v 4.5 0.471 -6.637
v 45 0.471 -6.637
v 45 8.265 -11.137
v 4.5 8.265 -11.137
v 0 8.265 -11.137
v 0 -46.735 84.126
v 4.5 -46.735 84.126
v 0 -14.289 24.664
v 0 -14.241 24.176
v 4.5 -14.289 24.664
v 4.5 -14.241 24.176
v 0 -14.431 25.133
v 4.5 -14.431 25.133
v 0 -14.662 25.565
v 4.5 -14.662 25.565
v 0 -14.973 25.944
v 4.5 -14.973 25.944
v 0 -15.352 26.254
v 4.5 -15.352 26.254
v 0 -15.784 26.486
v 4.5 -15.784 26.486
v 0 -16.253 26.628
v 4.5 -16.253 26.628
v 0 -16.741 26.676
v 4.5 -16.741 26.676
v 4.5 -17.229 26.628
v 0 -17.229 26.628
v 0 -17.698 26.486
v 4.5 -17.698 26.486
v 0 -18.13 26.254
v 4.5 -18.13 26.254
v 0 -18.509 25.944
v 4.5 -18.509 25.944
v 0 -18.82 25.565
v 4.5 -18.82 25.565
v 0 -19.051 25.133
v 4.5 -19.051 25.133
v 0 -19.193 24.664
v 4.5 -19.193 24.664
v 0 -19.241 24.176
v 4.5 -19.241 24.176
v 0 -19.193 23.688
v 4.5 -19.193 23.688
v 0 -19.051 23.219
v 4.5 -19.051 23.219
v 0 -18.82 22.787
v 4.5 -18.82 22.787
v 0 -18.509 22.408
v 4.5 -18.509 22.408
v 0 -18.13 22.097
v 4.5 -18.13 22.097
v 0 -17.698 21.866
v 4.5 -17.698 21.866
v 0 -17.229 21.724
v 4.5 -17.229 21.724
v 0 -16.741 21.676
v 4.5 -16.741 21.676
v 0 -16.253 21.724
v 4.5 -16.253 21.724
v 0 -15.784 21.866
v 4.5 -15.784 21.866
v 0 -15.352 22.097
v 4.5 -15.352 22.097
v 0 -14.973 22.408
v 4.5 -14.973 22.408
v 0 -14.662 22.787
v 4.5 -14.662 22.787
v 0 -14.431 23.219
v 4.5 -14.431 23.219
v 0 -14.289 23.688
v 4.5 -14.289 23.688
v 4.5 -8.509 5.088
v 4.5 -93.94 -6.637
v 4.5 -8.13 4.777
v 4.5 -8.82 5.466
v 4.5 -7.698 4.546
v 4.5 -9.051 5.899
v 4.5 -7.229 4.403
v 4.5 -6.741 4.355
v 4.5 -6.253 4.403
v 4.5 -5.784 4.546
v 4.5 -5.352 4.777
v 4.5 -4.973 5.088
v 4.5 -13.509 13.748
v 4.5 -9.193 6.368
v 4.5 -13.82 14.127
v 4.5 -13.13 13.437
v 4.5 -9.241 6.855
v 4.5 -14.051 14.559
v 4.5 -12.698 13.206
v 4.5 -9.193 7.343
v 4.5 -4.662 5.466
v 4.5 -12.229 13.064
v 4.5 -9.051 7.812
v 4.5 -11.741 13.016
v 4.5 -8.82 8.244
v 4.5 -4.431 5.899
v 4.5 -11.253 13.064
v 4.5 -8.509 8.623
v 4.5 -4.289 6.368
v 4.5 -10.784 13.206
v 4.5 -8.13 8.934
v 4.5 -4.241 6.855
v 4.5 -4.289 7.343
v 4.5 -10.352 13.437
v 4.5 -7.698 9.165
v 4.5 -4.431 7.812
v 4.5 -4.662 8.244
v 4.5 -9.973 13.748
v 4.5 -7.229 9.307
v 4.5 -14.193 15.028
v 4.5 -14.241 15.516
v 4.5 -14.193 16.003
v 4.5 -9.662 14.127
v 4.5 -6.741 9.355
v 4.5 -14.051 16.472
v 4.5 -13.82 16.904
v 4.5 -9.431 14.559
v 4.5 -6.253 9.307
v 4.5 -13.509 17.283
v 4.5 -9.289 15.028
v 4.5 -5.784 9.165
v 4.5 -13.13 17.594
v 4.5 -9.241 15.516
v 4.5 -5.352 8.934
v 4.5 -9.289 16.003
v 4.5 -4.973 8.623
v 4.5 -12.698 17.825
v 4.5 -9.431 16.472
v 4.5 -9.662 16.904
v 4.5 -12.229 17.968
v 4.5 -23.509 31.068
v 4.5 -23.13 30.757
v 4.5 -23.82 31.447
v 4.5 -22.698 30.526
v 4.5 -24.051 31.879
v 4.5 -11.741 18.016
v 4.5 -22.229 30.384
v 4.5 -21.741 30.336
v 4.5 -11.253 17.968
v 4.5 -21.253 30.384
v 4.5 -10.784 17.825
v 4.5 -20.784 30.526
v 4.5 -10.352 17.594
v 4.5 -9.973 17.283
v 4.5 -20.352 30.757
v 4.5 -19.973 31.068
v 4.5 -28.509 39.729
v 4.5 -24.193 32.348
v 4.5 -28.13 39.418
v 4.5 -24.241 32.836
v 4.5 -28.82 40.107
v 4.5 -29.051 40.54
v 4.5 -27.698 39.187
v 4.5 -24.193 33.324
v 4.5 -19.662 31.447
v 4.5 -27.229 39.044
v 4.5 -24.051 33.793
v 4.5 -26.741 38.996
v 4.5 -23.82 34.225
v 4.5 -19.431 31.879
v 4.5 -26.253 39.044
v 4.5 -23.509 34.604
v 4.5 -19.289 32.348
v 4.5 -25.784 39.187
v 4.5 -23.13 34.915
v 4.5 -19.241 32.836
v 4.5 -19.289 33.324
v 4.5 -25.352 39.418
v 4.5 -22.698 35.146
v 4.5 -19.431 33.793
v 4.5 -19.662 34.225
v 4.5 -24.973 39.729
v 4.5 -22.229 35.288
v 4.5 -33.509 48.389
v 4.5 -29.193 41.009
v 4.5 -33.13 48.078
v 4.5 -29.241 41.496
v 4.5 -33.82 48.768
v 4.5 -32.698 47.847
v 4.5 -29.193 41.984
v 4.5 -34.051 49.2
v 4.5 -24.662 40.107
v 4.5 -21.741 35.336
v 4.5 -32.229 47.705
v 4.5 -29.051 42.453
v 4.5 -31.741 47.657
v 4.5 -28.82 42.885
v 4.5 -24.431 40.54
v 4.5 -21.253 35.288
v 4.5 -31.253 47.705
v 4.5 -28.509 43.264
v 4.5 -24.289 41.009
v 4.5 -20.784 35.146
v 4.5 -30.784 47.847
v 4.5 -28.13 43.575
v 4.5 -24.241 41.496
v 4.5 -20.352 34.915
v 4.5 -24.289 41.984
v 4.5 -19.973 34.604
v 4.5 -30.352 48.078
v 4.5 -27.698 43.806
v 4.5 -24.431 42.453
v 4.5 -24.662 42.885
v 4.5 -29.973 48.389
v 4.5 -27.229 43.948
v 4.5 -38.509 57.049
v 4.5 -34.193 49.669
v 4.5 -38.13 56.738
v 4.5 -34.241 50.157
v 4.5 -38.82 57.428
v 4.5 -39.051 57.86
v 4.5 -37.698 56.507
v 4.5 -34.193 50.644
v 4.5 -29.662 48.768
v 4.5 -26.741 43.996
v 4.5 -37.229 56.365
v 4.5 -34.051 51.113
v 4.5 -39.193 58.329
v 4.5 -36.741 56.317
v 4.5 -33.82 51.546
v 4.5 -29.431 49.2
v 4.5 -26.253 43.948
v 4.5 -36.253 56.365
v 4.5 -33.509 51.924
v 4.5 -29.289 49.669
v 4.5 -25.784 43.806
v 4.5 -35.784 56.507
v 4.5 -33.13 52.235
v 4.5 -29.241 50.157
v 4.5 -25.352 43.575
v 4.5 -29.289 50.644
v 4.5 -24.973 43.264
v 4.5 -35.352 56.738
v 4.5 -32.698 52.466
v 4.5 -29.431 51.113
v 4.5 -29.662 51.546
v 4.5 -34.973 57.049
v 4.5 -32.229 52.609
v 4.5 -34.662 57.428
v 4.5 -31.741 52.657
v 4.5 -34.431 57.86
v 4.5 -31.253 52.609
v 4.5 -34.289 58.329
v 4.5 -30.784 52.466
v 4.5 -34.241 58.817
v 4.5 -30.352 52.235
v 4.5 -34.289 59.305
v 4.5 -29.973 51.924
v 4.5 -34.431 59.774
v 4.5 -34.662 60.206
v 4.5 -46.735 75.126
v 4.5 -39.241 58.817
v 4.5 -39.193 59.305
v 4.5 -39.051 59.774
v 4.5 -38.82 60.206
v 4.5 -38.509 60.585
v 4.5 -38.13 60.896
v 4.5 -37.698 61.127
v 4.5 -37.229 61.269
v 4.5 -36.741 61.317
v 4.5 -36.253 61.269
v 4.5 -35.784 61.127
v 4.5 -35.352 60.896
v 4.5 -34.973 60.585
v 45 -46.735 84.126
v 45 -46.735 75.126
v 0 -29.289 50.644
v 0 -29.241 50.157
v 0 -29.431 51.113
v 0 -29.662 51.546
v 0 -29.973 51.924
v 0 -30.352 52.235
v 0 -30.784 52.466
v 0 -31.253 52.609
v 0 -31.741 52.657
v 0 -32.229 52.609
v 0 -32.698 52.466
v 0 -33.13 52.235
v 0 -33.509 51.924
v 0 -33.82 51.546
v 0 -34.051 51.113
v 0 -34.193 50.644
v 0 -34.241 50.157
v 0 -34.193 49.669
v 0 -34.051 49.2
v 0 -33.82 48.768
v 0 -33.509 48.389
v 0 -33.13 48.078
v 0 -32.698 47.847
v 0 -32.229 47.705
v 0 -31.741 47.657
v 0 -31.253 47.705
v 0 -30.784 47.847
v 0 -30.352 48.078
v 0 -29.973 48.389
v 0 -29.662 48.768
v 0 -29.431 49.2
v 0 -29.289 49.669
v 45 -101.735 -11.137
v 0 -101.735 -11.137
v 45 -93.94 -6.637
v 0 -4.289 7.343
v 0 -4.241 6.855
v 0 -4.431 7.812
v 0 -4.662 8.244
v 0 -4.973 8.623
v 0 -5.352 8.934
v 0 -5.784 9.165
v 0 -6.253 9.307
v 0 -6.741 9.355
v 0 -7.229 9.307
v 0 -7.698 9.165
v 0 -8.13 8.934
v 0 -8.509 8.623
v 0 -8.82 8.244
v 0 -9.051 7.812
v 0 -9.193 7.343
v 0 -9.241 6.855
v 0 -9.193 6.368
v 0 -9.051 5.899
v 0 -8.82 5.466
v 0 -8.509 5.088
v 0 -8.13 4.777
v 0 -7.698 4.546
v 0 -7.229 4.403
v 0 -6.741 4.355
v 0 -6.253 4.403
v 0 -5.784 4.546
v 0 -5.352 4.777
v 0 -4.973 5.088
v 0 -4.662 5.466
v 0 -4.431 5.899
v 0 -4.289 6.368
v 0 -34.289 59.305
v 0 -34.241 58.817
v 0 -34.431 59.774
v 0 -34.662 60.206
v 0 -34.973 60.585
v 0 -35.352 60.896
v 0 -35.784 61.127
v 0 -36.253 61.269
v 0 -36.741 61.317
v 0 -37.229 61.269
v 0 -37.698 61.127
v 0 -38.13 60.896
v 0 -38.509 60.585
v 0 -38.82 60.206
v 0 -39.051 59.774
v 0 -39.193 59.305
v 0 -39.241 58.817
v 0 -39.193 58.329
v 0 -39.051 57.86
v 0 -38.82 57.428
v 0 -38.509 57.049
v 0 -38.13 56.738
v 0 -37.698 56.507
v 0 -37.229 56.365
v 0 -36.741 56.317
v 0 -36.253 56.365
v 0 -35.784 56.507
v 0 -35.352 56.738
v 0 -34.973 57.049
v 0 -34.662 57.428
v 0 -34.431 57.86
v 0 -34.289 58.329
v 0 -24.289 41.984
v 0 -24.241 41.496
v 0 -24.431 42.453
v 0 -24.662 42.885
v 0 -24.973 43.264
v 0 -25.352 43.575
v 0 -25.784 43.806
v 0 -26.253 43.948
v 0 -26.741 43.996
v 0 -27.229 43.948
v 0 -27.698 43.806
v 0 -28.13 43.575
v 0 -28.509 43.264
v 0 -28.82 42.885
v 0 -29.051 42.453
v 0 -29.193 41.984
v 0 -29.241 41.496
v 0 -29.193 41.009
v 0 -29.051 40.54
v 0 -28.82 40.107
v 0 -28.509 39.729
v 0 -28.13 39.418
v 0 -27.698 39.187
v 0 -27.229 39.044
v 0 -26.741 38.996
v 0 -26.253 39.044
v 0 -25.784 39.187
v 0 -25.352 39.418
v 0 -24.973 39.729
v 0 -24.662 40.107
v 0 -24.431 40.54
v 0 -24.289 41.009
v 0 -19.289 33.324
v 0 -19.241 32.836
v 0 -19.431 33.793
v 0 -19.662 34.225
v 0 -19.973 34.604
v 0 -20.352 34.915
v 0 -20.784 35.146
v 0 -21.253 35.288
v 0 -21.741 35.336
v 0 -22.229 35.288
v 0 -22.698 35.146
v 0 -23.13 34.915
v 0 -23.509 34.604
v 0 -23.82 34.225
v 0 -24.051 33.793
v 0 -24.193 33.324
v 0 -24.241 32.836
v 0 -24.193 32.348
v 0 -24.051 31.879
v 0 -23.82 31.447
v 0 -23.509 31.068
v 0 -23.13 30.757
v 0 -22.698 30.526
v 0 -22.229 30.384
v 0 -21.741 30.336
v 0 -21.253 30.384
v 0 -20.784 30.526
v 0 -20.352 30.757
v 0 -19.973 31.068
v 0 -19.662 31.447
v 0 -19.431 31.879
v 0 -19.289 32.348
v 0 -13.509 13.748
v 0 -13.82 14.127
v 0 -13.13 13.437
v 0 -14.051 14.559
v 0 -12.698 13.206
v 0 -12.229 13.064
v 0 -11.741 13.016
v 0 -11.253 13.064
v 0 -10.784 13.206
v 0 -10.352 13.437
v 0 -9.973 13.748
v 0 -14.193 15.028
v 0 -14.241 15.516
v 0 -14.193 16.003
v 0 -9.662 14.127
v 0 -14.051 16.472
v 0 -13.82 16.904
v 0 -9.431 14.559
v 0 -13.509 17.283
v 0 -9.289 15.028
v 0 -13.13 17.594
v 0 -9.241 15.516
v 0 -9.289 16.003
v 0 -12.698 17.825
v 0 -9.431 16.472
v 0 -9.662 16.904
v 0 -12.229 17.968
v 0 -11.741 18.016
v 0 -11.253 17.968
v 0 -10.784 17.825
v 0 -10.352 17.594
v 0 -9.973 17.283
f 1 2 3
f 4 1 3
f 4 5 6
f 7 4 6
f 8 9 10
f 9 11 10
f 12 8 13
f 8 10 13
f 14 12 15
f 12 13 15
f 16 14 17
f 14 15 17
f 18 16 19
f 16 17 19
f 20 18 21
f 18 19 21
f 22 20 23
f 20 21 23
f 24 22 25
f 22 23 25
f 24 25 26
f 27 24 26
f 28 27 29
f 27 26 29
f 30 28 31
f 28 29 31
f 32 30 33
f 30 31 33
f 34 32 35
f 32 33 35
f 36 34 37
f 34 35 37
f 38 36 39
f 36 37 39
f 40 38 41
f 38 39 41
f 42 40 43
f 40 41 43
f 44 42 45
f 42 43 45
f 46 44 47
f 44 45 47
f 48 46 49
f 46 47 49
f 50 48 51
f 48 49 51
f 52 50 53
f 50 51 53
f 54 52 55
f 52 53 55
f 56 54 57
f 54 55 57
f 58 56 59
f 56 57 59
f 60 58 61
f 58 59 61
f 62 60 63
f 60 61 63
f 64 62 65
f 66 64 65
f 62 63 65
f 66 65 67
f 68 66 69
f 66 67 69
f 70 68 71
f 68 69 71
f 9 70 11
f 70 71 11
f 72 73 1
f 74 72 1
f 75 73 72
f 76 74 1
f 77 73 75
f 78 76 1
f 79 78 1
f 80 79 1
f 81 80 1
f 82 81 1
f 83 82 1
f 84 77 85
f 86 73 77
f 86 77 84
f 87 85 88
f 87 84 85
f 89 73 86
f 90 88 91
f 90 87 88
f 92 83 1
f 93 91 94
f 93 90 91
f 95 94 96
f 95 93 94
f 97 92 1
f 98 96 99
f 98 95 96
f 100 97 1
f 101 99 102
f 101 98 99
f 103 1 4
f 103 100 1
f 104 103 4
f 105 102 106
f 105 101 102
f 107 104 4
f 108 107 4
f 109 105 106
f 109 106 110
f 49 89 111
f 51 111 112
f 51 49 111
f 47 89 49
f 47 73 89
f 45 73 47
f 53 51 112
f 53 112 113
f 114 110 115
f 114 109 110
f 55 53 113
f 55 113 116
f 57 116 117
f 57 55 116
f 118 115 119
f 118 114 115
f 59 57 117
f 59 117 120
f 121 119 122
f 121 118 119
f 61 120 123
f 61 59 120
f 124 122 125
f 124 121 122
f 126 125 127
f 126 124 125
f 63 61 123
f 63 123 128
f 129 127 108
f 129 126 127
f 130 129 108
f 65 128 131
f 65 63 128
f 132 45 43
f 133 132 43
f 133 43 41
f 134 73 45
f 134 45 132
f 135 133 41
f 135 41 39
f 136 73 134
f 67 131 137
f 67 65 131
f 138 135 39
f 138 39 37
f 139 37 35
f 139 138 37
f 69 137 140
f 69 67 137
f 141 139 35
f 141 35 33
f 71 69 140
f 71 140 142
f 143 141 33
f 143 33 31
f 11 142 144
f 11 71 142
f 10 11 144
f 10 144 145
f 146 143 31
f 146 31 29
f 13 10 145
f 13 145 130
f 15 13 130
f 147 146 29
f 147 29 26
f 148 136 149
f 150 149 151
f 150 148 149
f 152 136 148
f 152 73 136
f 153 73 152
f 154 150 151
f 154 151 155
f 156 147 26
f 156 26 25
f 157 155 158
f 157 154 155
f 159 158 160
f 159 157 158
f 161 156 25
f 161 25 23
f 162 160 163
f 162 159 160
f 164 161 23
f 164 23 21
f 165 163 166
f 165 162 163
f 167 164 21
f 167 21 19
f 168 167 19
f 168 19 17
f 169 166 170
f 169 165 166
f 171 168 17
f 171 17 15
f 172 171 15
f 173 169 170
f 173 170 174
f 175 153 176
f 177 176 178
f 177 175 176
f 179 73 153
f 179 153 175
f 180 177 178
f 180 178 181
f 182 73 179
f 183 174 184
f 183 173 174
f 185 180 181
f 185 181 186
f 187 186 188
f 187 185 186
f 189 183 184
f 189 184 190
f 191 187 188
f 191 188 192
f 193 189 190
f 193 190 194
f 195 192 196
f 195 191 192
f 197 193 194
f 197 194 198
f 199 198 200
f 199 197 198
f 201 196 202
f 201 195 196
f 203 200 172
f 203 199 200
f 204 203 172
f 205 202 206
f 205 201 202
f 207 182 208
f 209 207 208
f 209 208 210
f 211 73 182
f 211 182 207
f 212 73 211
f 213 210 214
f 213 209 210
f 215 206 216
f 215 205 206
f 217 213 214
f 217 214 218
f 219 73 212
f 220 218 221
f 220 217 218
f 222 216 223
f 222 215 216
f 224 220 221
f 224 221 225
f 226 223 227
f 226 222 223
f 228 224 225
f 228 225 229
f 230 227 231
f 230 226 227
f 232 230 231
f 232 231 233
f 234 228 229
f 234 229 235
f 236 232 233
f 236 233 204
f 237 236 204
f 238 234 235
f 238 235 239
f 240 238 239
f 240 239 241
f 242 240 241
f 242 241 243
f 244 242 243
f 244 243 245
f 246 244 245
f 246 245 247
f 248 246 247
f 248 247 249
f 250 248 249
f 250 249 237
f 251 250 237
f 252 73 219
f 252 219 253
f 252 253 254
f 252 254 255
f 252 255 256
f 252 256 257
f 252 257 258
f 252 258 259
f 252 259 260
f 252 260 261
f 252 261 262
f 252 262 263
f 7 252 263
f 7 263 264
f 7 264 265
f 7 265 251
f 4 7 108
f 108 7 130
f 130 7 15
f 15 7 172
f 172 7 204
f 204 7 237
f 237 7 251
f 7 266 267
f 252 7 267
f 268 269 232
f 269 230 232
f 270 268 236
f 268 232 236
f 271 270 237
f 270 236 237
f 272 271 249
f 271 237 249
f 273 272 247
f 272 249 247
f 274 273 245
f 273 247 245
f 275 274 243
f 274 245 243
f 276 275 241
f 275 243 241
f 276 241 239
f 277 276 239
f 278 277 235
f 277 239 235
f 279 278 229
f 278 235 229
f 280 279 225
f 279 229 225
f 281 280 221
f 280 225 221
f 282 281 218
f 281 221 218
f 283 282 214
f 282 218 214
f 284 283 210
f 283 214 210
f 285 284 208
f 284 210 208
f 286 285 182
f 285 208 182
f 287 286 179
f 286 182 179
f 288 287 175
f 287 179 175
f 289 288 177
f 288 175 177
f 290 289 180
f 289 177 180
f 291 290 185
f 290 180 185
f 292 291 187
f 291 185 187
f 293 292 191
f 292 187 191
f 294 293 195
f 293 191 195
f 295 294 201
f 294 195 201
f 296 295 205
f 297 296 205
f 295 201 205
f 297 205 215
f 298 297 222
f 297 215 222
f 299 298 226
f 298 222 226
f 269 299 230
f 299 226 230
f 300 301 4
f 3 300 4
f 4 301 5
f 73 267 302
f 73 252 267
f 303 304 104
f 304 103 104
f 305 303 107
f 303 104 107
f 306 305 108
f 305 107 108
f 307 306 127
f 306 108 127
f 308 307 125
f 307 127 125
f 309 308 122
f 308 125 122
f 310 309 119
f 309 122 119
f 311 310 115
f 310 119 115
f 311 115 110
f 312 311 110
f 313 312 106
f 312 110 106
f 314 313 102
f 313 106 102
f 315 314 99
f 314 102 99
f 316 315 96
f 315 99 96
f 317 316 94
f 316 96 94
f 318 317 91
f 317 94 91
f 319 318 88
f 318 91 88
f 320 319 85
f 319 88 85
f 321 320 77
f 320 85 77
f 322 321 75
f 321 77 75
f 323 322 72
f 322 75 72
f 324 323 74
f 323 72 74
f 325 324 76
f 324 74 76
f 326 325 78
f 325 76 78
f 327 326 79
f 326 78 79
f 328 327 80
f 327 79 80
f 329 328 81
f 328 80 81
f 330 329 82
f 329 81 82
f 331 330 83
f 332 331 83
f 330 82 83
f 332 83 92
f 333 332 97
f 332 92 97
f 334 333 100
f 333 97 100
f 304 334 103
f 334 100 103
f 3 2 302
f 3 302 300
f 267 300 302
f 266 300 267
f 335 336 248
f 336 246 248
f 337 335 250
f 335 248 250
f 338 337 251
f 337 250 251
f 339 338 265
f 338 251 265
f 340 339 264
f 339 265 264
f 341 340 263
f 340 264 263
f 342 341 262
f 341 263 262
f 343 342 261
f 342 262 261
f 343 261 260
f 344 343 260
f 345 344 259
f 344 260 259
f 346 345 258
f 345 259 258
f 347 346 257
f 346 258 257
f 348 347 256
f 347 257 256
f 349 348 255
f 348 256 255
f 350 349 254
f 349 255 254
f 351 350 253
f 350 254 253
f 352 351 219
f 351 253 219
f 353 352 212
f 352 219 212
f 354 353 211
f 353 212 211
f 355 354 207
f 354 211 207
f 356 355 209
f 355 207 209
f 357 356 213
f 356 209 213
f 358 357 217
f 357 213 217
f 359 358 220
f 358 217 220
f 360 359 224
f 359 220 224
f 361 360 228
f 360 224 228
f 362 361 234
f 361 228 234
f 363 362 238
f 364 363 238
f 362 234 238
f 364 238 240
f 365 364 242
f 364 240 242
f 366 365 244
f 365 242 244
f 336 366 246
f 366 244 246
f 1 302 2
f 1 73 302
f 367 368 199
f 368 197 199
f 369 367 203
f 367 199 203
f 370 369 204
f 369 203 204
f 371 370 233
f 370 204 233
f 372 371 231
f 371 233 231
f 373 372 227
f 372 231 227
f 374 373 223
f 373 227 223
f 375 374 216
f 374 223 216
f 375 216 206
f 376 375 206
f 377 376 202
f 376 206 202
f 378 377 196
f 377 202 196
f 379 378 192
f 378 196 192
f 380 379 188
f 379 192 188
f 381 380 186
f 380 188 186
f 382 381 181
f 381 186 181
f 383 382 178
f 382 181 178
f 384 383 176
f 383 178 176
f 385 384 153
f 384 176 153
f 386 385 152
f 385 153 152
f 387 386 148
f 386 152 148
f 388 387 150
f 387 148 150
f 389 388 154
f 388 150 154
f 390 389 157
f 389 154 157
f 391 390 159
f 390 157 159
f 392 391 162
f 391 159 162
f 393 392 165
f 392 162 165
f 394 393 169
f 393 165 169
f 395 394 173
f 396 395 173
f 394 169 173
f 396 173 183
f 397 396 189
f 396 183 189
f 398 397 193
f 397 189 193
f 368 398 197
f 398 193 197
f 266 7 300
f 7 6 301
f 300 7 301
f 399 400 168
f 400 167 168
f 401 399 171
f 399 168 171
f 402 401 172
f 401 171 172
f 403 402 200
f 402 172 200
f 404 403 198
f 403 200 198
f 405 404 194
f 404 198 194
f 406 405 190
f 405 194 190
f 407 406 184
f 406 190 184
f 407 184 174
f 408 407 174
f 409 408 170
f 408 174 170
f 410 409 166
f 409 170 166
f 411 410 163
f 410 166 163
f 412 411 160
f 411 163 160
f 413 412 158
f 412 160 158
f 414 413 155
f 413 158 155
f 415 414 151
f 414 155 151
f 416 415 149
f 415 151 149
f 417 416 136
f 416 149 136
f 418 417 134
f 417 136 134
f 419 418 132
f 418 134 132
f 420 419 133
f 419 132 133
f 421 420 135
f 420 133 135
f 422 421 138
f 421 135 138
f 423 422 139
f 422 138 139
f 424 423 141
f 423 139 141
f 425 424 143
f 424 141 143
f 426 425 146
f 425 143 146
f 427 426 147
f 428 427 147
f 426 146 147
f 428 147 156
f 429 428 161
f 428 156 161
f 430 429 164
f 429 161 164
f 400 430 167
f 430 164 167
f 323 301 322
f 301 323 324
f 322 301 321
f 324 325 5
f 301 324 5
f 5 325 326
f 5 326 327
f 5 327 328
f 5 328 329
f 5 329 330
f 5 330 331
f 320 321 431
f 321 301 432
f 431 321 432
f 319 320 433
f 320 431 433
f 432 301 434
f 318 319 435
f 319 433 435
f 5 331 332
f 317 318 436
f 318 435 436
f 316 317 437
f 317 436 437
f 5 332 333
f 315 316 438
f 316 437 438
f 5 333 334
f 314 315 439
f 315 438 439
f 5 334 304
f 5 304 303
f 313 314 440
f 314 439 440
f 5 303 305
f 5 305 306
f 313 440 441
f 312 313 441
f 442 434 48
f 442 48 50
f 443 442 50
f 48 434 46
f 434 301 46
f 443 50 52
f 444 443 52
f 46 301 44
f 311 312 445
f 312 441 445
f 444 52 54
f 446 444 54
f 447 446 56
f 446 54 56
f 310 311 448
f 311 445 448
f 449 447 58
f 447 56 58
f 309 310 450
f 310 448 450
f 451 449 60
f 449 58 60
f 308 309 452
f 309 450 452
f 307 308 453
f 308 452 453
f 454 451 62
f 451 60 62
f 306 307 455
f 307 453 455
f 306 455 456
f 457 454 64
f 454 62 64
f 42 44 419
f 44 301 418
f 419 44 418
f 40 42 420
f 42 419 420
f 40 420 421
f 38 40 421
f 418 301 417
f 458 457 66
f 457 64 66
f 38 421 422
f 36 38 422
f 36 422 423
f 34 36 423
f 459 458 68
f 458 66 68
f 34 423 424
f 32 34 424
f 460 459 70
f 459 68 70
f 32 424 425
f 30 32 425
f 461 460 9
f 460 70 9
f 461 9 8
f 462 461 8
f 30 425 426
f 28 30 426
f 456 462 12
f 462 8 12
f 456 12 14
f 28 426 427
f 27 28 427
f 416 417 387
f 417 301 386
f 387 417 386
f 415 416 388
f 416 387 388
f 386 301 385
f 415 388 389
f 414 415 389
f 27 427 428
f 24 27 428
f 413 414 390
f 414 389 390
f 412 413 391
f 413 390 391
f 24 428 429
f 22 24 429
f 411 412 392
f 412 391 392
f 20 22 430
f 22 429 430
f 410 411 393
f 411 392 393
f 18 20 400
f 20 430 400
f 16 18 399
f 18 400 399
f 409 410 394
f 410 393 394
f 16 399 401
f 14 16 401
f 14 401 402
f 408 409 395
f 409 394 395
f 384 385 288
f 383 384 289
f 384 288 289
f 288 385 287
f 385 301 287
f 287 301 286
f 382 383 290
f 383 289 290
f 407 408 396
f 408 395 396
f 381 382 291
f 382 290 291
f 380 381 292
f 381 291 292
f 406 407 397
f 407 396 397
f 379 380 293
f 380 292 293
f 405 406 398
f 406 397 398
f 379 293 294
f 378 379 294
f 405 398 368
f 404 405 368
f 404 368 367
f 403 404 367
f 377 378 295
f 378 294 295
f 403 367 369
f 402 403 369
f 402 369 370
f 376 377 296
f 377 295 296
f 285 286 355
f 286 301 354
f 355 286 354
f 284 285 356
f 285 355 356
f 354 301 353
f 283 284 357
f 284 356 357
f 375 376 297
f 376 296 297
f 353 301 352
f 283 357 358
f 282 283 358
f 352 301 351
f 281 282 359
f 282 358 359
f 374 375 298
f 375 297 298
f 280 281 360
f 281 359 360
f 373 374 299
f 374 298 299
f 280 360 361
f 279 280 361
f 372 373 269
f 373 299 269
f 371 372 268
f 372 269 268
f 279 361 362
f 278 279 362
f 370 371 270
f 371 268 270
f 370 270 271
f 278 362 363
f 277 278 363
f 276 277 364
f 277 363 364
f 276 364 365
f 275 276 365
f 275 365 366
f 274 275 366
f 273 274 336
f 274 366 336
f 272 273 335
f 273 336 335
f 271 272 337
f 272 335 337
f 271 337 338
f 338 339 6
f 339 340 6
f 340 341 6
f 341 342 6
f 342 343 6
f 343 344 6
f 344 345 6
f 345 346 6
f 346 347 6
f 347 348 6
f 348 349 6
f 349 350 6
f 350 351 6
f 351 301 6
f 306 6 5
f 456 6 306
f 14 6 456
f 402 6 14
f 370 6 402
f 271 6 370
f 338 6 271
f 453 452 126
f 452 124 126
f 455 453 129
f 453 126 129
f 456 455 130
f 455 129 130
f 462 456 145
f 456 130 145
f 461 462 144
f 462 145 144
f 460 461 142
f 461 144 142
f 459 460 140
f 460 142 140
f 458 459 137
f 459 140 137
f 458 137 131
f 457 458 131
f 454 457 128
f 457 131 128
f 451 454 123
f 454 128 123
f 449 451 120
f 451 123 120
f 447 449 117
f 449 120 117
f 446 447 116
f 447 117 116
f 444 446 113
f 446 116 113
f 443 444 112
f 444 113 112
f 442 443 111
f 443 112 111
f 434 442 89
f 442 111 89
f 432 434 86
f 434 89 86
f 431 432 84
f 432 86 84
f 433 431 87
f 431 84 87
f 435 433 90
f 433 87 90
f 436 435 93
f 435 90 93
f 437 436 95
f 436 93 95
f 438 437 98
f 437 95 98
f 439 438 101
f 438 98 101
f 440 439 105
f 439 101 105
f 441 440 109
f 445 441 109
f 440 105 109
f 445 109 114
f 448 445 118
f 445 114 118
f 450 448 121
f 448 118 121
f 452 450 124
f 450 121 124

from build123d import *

# Parameters (mm, degrees)
F1_DEPTH = 45
F2_T     = -4.5
F4_D     = 5
F4_DEPTH = 12
F4_TIP   = 1.5021515476
F6_DEPTH = 40.5


with BuildPart() as f1:
    # F0 (on Right) → F1 (new body)
    with BuildSketch(Plane.YZ):
        Polygon((-46.7345683003, 84.126270037), (-101.7345683003, -11.1365243793), (8.2654316997, -11.1365243793), align=None)
    extrude(amount=F1_DEPTH)

    # F2
    f2_openings = [f1.faces().sort_by_distance(p)[0] for p in [
        (45, -46.734568, 20.61774),
    ]]
    offset(amount=F2_T, openings=f2_openings)

    # F4
    with Locations(Plane(origin=(0, 0, 0), x_dir=(0, -1, 0), z_dir=(-1, 0, 0))):
        with Locations((36.7409650803, 58.8168415093), (31.7409650803, 50.1565874715), (26.7409650803, 41.4963334336), (21.7409650803, 32.8360793958), (16.7409650803, 24.1758253579), (11.7409650803, 15.5155713201), (6.7409650803, 6.8553172823)):
            Hole(F4_D / 2, depth=F4_DEPTH)
            with Locations((0, 0, -(F4_DEPTH + F4_TIP / 2))):  # 118° drill point
                Cone(0, F4_D / 2, F4_TIP, mode=Mode.SUBTRACT)

    # F5 (on face) → F6 (cut, symmetric)
    with BuildSketch(Plane.YZ.offset(45)):
        Polygon((-46.7345683003, 84.126270037), (-46.7345683003, 75.126270037), (0.4712030657, -6.6365243793), (8.2654316997, -11.1365243793), align=None)
    extrude(amount=F6_DEPTH, both=True, mode=Mode.SUBTRACT)


solid = f1.part
